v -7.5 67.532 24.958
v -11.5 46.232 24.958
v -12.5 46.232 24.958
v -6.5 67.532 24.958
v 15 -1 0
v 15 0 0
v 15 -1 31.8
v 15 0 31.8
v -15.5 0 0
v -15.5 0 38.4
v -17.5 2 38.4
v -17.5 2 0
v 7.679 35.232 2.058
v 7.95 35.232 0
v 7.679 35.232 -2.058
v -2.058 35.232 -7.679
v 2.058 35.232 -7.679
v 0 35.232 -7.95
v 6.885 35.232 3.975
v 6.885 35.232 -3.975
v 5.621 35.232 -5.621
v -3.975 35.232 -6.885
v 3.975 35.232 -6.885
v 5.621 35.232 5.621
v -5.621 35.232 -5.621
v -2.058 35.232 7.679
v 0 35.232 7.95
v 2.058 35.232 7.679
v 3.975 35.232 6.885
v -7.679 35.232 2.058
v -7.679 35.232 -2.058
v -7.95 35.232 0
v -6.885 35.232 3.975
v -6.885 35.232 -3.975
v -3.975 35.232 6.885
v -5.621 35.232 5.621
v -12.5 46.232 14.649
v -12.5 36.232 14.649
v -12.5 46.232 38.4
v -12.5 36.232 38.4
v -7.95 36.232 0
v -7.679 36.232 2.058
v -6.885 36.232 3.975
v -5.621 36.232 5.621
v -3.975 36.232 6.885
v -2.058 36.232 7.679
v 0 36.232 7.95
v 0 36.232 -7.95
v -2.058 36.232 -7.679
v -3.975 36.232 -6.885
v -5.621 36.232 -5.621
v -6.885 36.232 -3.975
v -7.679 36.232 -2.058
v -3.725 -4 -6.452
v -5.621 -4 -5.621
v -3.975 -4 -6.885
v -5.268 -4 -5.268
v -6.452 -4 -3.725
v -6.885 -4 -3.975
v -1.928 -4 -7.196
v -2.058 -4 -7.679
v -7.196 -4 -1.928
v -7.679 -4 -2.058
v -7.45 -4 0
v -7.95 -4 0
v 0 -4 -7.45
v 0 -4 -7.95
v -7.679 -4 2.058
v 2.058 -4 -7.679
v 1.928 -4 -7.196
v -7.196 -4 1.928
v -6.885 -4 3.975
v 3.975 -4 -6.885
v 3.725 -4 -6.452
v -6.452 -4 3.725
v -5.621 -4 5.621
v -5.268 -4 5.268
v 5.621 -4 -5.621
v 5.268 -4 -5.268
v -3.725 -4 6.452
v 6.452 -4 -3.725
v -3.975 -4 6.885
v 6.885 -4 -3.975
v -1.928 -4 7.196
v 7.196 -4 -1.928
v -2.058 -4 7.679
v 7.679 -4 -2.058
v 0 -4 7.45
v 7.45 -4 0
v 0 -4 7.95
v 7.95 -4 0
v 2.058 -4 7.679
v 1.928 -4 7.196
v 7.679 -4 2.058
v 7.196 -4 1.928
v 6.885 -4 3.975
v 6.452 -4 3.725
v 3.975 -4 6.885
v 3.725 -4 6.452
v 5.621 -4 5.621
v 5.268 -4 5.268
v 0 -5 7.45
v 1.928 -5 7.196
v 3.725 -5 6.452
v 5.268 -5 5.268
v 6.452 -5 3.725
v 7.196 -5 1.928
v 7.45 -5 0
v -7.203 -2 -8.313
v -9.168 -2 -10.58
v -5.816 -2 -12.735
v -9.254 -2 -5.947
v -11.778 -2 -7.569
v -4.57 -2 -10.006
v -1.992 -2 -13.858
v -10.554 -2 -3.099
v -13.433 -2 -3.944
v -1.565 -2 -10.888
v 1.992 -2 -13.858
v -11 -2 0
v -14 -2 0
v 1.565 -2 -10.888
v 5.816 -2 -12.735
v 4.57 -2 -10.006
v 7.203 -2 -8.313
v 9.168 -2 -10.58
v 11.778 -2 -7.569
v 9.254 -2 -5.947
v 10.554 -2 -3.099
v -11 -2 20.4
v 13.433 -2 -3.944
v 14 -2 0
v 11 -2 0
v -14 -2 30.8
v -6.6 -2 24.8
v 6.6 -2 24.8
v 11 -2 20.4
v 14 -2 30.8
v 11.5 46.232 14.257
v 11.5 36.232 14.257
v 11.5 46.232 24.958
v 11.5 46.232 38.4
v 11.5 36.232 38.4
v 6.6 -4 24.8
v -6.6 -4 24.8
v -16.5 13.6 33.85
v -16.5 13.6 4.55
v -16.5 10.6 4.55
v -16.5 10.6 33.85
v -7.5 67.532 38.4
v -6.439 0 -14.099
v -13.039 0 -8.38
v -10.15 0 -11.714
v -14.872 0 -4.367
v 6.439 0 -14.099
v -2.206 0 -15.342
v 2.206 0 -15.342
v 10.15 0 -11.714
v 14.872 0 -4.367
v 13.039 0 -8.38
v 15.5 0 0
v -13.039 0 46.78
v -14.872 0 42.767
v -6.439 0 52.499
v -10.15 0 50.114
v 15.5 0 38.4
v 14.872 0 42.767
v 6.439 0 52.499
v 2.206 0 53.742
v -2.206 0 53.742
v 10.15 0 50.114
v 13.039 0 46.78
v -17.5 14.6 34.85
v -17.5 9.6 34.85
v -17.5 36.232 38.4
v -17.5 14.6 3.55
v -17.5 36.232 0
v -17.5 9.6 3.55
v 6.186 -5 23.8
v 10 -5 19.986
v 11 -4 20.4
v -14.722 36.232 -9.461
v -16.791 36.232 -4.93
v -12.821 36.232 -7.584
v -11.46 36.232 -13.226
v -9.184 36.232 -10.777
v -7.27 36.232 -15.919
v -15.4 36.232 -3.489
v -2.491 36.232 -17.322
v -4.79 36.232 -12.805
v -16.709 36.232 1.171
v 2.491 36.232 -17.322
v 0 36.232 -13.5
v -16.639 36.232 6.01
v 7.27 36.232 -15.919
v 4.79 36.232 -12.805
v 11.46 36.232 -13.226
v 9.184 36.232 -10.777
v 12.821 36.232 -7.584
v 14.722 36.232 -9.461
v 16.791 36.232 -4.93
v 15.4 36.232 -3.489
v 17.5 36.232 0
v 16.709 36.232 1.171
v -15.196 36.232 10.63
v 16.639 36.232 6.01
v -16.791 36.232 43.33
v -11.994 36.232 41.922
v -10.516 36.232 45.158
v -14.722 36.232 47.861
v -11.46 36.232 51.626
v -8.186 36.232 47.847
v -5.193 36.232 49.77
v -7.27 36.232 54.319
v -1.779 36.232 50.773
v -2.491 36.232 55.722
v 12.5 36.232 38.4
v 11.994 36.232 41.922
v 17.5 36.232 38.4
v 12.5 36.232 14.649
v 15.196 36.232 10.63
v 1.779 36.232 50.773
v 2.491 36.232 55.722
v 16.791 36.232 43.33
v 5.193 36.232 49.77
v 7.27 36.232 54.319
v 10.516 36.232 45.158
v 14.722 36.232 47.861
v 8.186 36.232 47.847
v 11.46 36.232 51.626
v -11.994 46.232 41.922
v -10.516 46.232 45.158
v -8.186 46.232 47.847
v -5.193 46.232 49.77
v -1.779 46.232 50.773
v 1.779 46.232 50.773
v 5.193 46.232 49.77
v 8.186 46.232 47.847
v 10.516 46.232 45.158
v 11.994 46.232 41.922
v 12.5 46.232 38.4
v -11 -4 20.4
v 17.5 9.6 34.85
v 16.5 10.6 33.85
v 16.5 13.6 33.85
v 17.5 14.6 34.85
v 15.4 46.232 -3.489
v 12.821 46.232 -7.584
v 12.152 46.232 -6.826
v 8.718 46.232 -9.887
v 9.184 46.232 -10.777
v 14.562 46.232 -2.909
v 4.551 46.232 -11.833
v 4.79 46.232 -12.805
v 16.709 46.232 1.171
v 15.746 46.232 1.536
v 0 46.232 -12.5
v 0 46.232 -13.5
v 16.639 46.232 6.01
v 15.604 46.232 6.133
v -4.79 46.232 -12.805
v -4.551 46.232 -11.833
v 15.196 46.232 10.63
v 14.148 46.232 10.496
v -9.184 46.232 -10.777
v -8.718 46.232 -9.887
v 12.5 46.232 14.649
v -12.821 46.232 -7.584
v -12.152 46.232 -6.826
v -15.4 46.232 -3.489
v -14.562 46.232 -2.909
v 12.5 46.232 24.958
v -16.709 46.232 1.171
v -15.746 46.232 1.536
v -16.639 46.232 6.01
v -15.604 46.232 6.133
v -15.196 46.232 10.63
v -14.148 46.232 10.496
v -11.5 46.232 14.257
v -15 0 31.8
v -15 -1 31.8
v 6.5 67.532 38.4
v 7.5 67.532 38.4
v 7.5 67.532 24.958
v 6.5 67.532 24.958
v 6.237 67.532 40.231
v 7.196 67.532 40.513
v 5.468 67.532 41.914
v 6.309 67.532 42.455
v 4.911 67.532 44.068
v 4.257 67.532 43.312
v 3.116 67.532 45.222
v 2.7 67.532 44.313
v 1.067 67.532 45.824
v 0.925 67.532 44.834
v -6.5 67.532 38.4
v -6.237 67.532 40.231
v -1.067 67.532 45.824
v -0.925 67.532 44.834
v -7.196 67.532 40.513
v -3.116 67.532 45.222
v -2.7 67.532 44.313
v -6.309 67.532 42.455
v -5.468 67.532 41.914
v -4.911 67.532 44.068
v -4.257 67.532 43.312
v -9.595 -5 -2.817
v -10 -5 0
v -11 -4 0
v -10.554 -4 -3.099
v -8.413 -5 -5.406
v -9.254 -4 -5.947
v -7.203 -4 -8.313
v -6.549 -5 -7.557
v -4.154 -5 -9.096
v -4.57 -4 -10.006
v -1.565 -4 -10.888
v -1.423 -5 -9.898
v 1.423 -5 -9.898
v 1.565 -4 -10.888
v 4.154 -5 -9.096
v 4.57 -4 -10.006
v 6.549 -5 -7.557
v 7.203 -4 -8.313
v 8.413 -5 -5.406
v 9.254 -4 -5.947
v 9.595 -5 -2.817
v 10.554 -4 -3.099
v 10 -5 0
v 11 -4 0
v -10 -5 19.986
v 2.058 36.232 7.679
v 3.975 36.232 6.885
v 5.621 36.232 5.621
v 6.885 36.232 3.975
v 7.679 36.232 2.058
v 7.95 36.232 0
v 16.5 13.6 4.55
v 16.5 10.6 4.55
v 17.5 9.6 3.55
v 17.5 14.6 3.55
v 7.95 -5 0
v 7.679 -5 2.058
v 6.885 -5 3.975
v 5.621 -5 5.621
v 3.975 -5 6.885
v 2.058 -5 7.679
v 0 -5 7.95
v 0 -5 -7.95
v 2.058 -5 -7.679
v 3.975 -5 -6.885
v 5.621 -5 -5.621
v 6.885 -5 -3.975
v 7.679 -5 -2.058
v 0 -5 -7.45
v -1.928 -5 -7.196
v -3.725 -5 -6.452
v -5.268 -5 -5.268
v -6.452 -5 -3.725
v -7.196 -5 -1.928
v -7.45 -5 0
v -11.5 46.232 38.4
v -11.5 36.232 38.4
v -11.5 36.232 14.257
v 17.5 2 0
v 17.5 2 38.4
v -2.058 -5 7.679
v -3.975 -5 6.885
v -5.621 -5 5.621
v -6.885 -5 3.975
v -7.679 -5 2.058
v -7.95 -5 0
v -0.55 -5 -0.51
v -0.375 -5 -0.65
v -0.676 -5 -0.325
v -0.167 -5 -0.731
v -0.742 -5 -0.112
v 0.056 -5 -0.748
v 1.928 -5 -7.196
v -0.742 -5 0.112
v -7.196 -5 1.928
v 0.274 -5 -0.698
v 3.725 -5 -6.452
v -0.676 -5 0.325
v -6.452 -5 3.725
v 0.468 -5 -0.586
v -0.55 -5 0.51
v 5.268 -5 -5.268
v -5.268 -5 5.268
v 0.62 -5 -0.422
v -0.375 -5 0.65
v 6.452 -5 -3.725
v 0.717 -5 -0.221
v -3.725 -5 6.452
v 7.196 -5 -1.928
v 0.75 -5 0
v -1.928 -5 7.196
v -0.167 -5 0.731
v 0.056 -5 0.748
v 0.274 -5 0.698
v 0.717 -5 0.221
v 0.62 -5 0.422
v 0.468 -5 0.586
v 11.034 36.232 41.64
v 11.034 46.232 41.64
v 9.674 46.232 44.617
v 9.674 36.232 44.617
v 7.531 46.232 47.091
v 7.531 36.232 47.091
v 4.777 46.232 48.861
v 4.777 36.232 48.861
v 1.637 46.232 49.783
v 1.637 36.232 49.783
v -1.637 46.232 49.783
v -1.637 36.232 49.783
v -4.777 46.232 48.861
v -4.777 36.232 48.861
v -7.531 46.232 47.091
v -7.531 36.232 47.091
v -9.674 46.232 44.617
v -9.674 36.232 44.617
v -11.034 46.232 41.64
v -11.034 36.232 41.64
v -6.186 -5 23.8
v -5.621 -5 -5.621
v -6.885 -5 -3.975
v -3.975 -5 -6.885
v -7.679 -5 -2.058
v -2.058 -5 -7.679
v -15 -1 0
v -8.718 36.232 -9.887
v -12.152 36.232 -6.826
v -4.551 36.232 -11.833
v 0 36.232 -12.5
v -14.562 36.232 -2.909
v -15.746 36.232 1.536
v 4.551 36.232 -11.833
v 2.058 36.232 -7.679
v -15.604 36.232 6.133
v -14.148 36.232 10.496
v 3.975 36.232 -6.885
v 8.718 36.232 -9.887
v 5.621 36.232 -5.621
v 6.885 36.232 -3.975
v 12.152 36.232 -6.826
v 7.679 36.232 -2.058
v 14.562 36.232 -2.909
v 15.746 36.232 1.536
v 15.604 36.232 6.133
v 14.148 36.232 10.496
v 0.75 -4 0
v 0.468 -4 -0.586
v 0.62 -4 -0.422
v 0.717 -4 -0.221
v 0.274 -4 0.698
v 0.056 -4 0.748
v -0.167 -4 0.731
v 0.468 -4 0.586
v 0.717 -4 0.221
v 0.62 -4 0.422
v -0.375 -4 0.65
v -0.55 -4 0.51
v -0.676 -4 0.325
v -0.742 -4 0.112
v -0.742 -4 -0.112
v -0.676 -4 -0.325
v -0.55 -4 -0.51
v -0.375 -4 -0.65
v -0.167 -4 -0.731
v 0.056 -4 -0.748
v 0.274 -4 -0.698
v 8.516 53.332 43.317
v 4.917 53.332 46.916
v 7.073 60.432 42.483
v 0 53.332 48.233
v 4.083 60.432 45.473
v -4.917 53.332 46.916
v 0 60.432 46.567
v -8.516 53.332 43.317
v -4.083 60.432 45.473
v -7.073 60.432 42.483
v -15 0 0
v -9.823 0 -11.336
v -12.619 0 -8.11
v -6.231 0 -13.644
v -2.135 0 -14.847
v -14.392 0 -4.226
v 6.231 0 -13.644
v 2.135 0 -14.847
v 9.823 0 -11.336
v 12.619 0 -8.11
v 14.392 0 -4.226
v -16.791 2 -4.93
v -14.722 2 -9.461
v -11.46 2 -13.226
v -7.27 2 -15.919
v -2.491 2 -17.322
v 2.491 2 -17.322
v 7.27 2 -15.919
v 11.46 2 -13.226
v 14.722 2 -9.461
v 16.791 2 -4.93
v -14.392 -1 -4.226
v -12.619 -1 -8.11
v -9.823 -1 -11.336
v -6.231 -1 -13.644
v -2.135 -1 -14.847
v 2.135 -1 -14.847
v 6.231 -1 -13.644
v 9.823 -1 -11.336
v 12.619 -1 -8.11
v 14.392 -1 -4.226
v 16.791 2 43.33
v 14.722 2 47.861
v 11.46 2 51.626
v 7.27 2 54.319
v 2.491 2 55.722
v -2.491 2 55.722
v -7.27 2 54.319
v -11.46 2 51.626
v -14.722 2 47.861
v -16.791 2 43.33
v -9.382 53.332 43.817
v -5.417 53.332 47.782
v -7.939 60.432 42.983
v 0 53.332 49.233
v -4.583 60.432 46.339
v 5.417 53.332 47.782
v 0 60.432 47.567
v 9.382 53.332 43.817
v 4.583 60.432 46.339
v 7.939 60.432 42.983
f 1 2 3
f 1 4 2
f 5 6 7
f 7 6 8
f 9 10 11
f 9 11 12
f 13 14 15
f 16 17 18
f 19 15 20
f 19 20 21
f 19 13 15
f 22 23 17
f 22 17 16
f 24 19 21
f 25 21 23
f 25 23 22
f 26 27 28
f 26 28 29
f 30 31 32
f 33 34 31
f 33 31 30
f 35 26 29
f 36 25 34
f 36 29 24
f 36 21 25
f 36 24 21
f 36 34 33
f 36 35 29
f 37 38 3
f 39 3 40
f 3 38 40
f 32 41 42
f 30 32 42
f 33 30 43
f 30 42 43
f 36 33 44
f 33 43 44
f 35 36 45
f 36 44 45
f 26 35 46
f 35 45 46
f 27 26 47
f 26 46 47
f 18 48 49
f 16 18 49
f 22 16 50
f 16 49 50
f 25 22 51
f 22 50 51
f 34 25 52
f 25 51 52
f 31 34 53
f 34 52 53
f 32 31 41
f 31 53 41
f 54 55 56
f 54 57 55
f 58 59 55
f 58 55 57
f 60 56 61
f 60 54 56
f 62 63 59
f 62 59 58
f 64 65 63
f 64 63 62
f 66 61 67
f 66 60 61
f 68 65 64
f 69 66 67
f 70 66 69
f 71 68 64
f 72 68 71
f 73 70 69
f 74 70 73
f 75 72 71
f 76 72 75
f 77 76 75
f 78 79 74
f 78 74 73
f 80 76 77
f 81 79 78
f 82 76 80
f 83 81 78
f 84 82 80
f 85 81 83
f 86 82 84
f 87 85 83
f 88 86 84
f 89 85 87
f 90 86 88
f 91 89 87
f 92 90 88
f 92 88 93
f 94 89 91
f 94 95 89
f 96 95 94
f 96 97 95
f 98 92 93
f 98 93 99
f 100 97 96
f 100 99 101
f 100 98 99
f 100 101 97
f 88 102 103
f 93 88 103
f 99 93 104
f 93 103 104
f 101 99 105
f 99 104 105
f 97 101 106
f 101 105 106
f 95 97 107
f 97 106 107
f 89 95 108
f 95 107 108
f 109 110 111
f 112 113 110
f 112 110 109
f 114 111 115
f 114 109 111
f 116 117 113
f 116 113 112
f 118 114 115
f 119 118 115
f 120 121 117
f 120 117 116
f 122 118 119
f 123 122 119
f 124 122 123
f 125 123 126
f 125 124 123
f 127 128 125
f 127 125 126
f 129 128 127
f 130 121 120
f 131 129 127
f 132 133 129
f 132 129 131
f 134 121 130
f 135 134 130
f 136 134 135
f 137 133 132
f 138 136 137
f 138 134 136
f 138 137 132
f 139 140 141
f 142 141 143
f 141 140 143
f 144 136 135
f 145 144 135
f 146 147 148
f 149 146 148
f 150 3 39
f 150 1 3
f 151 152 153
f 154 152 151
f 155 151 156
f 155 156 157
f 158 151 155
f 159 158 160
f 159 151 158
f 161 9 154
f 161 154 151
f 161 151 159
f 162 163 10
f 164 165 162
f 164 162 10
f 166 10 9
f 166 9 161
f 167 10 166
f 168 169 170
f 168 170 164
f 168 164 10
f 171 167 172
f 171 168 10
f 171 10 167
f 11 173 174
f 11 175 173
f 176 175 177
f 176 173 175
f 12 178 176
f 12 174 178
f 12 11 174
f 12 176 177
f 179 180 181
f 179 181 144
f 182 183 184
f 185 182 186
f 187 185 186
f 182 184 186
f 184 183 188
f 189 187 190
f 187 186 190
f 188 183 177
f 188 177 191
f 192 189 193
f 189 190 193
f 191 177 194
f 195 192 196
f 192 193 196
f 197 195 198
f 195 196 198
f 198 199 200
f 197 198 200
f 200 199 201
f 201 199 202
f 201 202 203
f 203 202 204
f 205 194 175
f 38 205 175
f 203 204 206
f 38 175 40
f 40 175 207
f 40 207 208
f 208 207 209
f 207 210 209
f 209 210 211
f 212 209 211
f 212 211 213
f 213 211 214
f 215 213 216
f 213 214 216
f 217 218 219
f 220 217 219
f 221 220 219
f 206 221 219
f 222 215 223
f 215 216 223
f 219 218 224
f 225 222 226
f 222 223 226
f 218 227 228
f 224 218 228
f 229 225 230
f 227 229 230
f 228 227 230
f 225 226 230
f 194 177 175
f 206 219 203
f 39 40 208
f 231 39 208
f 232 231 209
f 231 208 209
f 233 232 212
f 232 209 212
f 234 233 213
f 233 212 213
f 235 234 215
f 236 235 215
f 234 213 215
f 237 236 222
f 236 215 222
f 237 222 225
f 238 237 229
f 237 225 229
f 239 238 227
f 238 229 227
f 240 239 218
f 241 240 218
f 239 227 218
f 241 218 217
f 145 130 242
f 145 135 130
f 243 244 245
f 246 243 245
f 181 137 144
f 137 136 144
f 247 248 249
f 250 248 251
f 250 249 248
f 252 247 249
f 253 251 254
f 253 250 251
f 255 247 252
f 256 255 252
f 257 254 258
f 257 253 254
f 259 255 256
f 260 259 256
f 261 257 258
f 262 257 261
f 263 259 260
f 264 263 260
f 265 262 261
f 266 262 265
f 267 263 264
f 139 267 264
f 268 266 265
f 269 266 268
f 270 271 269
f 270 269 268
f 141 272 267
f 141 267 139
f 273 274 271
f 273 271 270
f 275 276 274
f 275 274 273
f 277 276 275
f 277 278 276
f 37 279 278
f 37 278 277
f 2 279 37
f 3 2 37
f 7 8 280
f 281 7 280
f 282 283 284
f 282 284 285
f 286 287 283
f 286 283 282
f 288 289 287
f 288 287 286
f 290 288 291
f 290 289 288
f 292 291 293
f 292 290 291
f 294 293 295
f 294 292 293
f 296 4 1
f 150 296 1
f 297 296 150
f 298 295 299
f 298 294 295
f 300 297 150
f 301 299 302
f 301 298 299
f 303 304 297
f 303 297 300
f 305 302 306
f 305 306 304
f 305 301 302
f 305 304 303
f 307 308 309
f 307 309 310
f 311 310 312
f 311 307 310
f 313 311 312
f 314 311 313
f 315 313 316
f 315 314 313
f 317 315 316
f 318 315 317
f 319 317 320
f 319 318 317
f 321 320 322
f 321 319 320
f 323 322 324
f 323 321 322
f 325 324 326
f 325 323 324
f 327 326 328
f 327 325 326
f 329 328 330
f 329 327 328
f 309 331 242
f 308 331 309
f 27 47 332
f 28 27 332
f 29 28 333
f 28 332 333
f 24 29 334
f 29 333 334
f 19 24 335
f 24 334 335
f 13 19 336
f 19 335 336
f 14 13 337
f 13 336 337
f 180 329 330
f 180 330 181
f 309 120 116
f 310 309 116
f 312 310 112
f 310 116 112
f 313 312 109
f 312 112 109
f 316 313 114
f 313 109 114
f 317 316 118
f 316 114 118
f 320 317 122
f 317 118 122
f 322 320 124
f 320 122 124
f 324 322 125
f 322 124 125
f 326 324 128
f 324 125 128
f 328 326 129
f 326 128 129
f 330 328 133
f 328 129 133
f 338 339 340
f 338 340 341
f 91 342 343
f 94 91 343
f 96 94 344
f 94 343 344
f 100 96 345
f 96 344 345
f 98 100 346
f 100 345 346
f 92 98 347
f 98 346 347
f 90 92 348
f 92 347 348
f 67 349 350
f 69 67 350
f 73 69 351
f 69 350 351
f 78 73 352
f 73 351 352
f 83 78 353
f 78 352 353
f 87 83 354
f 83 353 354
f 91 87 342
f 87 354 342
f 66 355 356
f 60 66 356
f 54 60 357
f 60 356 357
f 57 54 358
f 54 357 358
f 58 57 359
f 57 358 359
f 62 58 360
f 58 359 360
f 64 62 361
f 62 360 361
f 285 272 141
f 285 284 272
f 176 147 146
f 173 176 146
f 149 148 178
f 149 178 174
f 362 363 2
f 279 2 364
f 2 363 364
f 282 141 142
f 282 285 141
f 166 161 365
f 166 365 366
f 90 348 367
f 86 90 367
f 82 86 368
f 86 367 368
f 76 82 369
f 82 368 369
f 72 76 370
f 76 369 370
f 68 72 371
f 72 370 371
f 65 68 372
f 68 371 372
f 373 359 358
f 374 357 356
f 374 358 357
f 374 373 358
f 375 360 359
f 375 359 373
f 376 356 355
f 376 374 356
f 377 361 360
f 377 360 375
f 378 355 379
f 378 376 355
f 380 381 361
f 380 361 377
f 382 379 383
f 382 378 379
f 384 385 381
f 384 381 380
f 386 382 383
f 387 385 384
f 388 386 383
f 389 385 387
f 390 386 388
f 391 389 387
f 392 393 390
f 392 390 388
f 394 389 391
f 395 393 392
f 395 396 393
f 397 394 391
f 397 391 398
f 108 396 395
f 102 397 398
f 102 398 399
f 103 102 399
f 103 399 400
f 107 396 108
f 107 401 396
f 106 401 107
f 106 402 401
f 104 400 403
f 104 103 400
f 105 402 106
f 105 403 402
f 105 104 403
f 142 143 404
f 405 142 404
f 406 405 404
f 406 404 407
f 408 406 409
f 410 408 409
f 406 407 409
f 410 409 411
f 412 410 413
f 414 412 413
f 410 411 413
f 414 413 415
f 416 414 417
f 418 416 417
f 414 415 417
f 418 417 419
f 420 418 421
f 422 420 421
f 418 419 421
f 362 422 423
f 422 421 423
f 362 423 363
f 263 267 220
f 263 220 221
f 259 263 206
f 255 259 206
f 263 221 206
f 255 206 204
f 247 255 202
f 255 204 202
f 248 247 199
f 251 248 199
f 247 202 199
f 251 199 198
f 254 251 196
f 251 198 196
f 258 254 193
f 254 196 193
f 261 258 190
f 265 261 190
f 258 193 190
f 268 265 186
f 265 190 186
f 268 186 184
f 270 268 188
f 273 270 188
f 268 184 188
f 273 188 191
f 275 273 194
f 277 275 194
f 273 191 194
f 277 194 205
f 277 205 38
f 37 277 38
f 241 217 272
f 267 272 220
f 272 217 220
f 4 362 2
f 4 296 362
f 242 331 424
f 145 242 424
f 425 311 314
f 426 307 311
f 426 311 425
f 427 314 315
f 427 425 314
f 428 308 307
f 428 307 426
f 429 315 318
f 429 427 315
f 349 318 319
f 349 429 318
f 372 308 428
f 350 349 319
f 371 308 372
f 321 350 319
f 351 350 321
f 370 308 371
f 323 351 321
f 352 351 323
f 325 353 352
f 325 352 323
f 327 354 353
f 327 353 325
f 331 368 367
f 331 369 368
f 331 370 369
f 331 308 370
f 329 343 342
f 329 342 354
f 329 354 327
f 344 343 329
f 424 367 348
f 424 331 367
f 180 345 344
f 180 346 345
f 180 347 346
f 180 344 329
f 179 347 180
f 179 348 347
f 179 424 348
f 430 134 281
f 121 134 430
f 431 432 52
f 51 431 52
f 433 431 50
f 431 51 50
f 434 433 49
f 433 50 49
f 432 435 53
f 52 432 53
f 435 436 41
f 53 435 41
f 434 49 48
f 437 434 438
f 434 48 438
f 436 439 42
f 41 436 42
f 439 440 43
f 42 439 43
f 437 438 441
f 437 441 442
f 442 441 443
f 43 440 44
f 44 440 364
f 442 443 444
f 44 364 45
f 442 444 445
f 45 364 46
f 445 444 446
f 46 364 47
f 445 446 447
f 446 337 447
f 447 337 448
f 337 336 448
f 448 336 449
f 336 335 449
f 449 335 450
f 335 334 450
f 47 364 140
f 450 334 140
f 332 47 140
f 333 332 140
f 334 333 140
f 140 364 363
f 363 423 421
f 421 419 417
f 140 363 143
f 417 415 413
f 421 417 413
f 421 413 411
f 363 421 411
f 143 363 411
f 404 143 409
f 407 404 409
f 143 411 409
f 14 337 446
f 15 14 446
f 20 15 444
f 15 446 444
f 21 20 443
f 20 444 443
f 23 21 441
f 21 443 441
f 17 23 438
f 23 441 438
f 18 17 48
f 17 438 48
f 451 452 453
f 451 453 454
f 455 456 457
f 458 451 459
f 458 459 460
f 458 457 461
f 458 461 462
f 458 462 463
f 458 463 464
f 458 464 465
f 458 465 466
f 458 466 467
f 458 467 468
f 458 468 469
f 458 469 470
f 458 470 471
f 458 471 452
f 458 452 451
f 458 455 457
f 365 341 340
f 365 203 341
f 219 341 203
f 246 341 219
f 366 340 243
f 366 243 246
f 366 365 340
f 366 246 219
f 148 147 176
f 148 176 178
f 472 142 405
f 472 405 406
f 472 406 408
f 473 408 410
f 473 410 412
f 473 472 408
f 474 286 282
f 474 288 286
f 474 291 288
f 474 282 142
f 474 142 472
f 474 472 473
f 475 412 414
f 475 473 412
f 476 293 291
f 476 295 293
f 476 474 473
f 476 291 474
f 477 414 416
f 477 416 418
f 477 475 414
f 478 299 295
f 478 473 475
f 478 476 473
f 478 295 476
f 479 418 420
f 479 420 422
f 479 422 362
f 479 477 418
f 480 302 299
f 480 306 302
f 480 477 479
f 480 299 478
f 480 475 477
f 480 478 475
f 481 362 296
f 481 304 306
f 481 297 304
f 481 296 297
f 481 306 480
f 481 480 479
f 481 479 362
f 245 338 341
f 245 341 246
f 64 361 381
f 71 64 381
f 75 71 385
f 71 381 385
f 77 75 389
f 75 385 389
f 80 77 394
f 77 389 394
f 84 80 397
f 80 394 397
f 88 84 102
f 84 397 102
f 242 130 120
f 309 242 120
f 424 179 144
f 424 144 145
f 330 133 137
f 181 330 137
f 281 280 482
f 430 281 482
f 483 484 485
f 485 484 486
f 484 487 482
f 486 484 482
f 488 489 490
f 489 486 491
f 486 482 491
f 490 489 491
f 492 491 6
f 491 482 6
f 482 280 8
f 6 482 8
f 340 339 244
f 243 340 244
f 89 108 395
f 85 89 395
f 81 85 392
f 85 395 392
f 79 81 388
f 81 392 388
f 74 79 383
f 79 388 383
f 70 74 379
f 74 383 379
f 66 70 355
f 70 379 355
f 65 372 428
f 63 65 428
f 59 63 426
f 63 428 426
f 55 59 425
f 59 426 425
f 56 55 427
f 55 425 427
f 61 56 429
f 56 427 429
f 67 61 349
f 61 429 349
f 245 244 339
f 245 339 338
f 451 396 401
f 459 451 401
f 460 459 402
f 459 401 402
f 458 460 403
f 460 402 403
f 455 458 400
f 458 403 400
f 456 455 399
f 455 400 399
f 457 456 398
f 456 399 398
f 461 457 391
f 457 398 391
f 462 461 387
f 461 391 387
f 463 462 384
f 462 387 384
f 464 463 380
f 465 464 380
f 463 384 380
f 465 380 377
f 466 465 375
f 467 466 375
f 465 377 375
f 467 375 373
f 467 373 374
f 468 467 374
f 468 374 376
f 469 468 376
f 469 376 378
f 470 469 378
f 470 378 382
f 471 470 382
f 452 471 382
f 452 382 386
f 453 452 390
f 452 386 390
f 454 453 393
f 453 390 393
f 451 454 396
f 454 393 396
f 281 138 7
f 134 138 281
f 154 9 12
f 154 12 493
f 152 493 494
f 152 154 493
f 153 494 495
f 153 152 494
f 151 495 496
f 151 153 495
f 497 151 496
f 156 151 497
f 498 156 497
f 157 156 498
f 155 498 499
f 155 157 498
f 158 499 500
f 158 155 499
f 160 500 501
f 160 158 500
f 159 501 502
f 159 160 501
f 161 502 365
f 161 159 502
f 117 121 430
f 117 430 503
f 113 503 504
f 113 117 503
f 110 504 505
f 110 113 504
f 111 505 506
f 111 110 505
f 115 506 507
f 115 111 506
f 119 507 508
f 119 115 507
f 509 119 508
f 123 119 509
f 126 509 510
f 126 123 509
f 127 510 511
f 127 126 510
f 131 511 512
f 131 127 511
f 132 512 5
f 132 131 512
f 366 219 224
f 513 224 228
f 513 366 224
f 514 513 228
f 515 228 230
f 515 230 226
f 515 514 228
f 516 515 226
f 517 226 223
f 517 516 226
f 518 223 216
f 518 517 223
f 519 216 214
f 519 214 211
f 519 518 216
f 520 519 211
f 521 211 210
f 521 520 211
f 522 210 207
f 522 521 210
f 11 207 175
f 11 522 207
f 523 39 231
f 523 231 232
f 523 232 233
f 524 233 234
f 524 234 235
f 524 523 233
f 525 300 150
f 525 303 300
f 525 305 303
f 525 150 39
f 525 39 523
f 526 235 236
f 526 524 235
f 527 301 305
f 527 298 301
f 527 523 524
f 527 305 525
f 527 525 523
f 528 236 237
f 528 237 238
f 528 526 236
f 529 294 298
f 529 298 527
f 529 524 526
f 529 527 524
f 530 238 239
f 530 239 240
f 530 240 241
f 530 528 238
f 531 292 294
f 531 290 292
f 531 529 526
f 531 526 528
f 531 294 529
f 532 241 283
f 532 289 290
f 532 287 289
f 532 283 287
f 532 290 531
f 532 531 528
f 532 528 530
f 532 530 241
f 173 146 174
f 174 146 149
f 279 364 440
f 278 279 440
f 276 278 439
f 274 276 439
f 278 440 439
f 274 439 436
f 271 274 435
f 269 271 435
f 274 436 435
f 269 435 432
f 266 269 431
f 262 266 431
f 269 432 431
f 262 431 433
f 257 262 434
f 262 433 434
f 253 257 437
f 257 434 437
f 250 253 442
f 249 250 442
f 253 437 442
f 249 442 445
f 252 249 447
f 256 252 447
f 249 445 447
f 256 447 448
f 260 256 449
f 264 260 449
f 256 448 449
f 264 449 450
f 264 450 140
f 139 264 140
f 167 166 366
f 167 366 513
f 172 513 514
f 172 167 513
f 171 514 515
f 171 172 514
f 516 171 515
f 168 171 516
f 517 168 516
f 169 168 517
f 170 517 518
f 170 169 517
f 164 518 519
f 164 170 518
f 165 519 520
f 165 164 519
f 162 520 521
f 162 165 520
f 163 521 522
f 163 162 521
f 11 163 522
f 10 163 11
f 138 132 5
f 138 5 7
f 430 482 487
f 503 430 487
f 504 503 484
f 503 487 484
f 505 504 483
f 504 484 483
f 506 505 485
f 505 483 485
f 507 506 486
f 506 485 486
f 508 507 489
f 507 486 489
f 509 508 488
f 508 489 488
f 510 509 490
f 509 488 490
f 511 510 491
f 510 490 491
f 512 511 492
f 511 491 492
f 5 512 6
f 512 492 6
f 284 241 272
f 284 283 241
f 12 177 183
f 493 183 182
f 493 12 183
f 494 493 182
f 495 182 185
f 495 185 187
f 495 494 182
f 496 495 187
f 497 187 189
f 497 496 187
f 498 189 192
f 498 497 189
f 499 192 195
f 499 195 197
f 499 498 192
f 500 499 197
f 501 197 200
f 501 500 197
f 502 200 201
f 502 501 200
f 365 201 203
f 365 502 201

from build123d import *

# Parameters (mm, degrees)
F1_DEPTH  = 36.232
F2_DEPTH  = 2
F4_DEPTH  = 3
F5_SIZE   = 1
F6_SIZE   = 4.4
F7_SIZE   = 1
F8_R      = 0.75
F9_DEPTH  = 1
F10_SIZE  = 2
F11_W     = 5
F11_H     = 31.3
F12_DEPTH = 1
F13_W     = 5
F13_H     = 31.3
F14_DEPTH = 1
F15_SIZE  = 0.99999
F17_DEPTH = 10
F18_DEPTH = 1


# Not quite as in the source:
# - a fillet or chamfer is up to 0.001 mm smaller than in the source, because OpenCascade refuses the exact size


with BuildPart() as f1:
    # F0 (on Front) → F1 (new body)
    with BuildSketch(Plane.XZ):
        with BuildLine():
            Line((-17.5, 38.4), (-17.5, 0))
            ThreePointArc((-17.5, 0), (0, -17.5), (17.5, 0))
            Line((17.5, 0), (17.5, 38.4))
            ThreePointArc((17.5, 38.4), (0, 55.9), (-17.5, 38.4))
        make_face()
        with BuildLine():
            ThreePointArc((15, 0), (0, -15), (-15, 0))
            Line((-15, 0), (-15, 31.8))
            Line((-15, 31.8), (-15, 38.4))
            ThreePointArc((-15, 38.4), (0, 53.4), (15, 38.4))
            Line((15, 38.4), (15, 31.8))
            Line((15, 31.8), (15, 0))
        make_face(mode=Mode.SUBTRACT)
        with BuildLine():
            Line((-15, 31.8), (-15, 0))
            ThreePointArc((-15, 0), (0, -15), (15, 0))
            Line((15, 0), (15, 31.8))
            Line((15, 31.8), (-15, 31.8))
        make_face()
        with BuildLine():
            ThreePointArc((11, 0), (0, -11), (-11, 0))
            Line((-11, 0), (-11, 24.8))
            Line((-11, 24.8), (11, 24.8))
            Line((11, 24.8), (11, 0))
        make_face(mode=Mode.SUBTRACT)
        with BuildLine():
            Line((-11, 24.8), (-11, 0))
            ThreePointArc((-11, 0), (0, -11), (11, 0))
            Line((11, 0), (11, 24.8))
            Line((11, 24.8), (-11, 24.8))
        make_face()
        with BuildLine():
            ThreePointArc((0, -7.95), (-5.6214989104, -5.6214989104), (-7.95, 0))
            ThreePointArc((-7.95, 0), (-5.6214989104, 5.6214989104), (0, 7.95))
            ThreePointArc((0, 7.95), (5.6214989104, 5.6214989104), (7.95, 0))
            ThreePointArc((7.95, 0), (5.6214989104, -5.6214989104), (0, -7.95))
        make_face(mode=Mode.SUBTRACT)
        with BuildLine():
            Line((-15, 38.4), (-15, 31.8))
            Line((-15, 31.8), (15, 31.8))
            Line((15, 31.8), (15, 38.4))
            ThreePointArc((15, 38.4), (0, 53.4), (-15, 38.4))
        make_face()
        with BuildLine():
            ThreePointArc((0, 7.95), (-5.6214989104, 5.6214989104), (-7.95, 0))
            ThreePointArc((-7.95, 0), (-5.6214989104, -5.6214989104), (0, -7.95))
            ThreePointArc((0, -7.95), (5.6214989104, -5.6214989104), (7.95, 0))
            ThreePointArc((7.95, 0), (5.6214989104, 5.6214989104), (0, 7.95))
        make_face()
    extrude(amount=-F1_DEPTH)

    # F10
    f10_edges = [f1.edges().sort_by_distance(p)[0] for p in [
        (-17.5, 0, 19.2),
    ]]
    chamfer(f10_edges, length=F10_SIZE)

    # F11 (on face) → F12 (cut)
    with BuildSketch(Plane(origin=(-17.5, 0, 0), x_dir=(0, -1, 0), z_dir=(-1, 0, 0))):
        with Locations((-12.1, 19.2)):
            Rectangle(F11_W, F11_H)
    extrude(amount=-F12_DEPTH, mode=Mode.SUBTRACT)

    # F13 (on face) → F14 (cut)
    with BuildSketch(Plane.YZ.offset(17.5)):
        with Locations((12.1, 19.2)):
            Rectangle(F13_W, F13_H)
    extrude(amount=-F14_DEPTH, mode=Mode.SUBTRACT)

    # F15 (size 1 in the source; OpenCascade refuses exactly that, so slightly less here)
    f15_edges = [f1.edges().sort_by_distance(p)[0] for p in [
        (16.5, 14.6, 19.2),
        (16.5, 9.6, 19.2),
        (16.5, 12.1, 34.85),
        (16.5, 12.1, 3.55),
        (-16.5, 12.1, 3.55),
        (-16.5, 9.6, 19.2),
        (-16.5, 12.1, 34.85),
        (-16.5, 14.6, 19.2),
    ]]
    chamfer(f15_edges, length=F15_SIZE)

    # F16 (on face) → F17 (join)
    with BuildSketch(Plane(origin=(0, 36.232, 0), x_dir=(-1, 0, 0), z_dir=(0, 1, 0))):
        with BuildLine():
            ThreePointArc((12.5, 38.4), (0, 50.9), (-12.5, 38.4))
            Line((-12.5, 38.4), (-12.5, 14.6492256372))
            ThreePointArc((-12.5, 14.6492256372), (0, -13.5), (12.5, 14.6492256372))
            Line((12.5, 14.6492256372), (12.5, 38.4))
        make_face()
        with BuildLine():
            ThreePointArc((-11.5, 38.4), (0, 49.9), (11.5, 38.4))
            Line((11.5, 38.4), (11.5, 14.2574515814))
            ThreePointArc((11.5, 14.2574515814), (0, -12.5), (-11.5, 14.2574515814))
            Line((-11.5, 14.2574515814), (-11.5, 38.4))
        make_face(mode=Mode.SUBTRACT)
    extrude(amount=F17_DEPTH)

    # F16 (on face) → F18 (cut)
    with BuildSketch(Plane(origin=(0, 36.232, 0), x_dir=(-1, 0, 0), z_dir=(0, 1, 0))):
        with BuildLine():
            ThreePointArc((0, -7.95), (5.6214989104, -5.6214989104), (7.95, 0))
            ThreePointArc((7.95, 0), (5.6214989104, 5.6214989104), (0, 7.95))
            ThreePointArc((0, 7.95), (-5.6214989104, 5.6214989104), (-7.95, 0))
            ThreePointArc((-7.95, 0), (-5.6214989104, -5.6214989104), (0, -7.95))
        make_face()
    extrude(amount=-F18_DEPTH, mode=Mode.SUBTRACT)

    # F19 (on face) → F22 section 0
    with BuildSketch(Plane(origin=(0, 46.232, 0), x_dir=(-1, 0, 0), z_dir=(0, 1, 0))):
        with BuildLine():
            Line((12.5, 24.958), (12.5, 38.4))
            ThreePointArc((12.5, 38.4), (0, 50.9), (-12.5, 38.4))
            Line((-12.5, 38.4), (-12.5, 24.958))
            Line((-12.5, 24.958), (-11.5, 24.958))
            Line((-11.5, 24.958), (-11.5, 38.4))
            ThreePointArc((-11.5, 38.4), (0, 49.9), (11.5, 38.4))
            Line((11.5, 38.4), (11.5, 24.958))
            Line((11.5, 24.958), (12.5, 24.958))
        make_face()
    # F21 (on offset) → F22 section 1
    with BuildSketch(Plane(origin=(0, 67.532, 0), x_dir=(-1, 0, 0), z_dir=(0, 1, 0))):
        with BuildLine():
            ThreePointArc((7.5, 38.4), (0, 45.9), (-7.5, 38.4))
            Line((-7.5, 38.4), (-7.5, 24.958))
            Line((-7.5, 24.958), (-6.5, 24.958))
            Line((-6.5, 24.958), (-6.5, 38.4))
            ThreePointArc((-6.5, 38.4), (0, 44.9), (6.5, 38.4))
            Line((6.5, 38.4), (6.5, 24.958))
            Line((6.5, 24.958), (7.5, 24.958))
            Line((7.5, 24.958), (7.5, 38.4))
        make_face()
    loft()


with BuildPart() as f2:
    # F0 (on Front) → F2 (new body)
    with BuildSketch(Plane.XZ):
        with BuildLine():
            Line((-15, 31.8), (-15, 0))
            ThreePointArc((-15, 0), (0, -15), (15, 0))
            Line((15, 0), (15, 31.8))
            Line((15, 31.8), (-15, 31.8))
        make_face()
        with BuildLine():
            ThreePointArc((11, 0), (0, -11), (-11, 0))
            Line((-11, 0), (-11, 24.8))
            Line((-11, 24.8), (11, 24.8))
            Line((11, 24.8), (11, 0))
        make_face(mode=Mode.SUBTRACT)
        with BuildLine():
            Line((-11, 24.8), (-11, 0))
            ThreePointArc((-11, 0), (0, -11), (11, 0))
            Line((11, 0), (11, 24.8))
            Line((11, 24.8), (-11, 24.8))
        make_face()
        with BuildLine():
            ThreePointArc((0, -7.95), (-5.6214989104, -5.6214989104), (-7.95, 0))
            ThreePointArc((-7.95, 0), (-5.6214989104, 5.6214989104), (0, 7.95))
            ThreePointArc((0, 7.95), (5.6214989104, 5.6214989104), (7.95, 0))
            ThreePointArc((7.95, 0), (5.6214989104, -5.6214989104), (0, -7.95))
        make_face(mode=Mode.SUBTRACT)
        with BuildLine():
            ThreePointArc((0, 7.95), (-5.6214989104, 5.6214989104), (-7.95, 0))
            ThreePointArc((-7.95, 0), (-5.6214989104, -5.6214989104), (0, -7.95))
            ThreePointArc((0, -7.95), (5.6214989104, -5.6214989104), (7.95, 0))
            ThreePointArc((7.95, 0), (5.6214989104, 5.6214989104), (0, 7.95))
        make_face()
    extrude(amount=F2_DEPTH)

    # F3 (on face) → F4 (join)
    with BuildSketch(Plane.XZ.offset(2)):
        with BuildLine():
            Line((-11, 24.8), (-11, 0))
            ThreePointArc((-11, 0), (0, -11), (11, 0))
            Line((11, 0), (11, 24.8))
            Line((11, 24.8), (-11, 24.8))
        make_face()
        with BuildLine():
            ThreePointArc((0, 7.95), (5.6214989104, 5.6214989104), (7.95, 0))
            ThreePointArc((7.95, 0), (5.6214989104, -5.6214989104), (0, -7.95))
            ThreePointArc((0, -7.95), (-5.6214989104, -5.6214989104), (-7.95, 0))
            ThreePointArc((-7.95, 0), (-5.6214989104, 5.6214989104), (0, 7.95))
        make_face(mode=Mode.SUBTRACT)
        with BuildLine():
            ThreePointArc((0, -7.95), (5.6214989104, -5.6214989104), (7.95, 0))
            ThreePointArc((7.95, 0), (5.6214989104, 5.6214989104), (0, 7.95))
            ThreePointArc((0, 7.95), (-5.6214989104, 5.6214989104), (-7.95, 0))
            ThreePointArc((-7.95, 0), (-5.6214989104, -5.6214989104), (0, -7.95))
        make_face()
    extrude(amount=F4_DEPTH)

    # F5
    f5_edges = [f2.edges().sort_by_distance(p)[0] for p in [
        (0, -2, 31.8),
        (-15, -2, 15.9),
    ]]
    chamfer(f5_edges, length=F5_SIZE)

    # F6
    f6_edges = [f2.edges().sort_by_distance(p)[0] for p in [
        (11, -3.5, 24.8),
        (-11, -3.5, 24.8),
    ]]
    chamfer(f6_edges, length=F6_SIZE)

    # F7
    f7_edges = [f2.edges().sort_by_distance(p)[0] for p in [
        (-11, -5, 10.2),
        (0, -5, 24.8),
        (-8.8, -5, 22.6),
        (8.8, -5, 22.6),
    ]]
    chamfer(f7_edges, length=F7_SIZE)

    # F8 (on face) → F9 (cut)
    with BuildSketch(Plane.XZ.offset(5)):
        with BuildLine():
            ThreePointArc((0, 7.95), (-5.6214989104, 5.6214989104), (-7.95, 0))
            ThreePointArc((-7.95, 0), (-5.6214989104, -5.6214989104), (0, -7.95))
            ThreePointArc((0, -7.95), (5.6214989104, -5.6214989104), (7.95, 0))
            ThreePointArc((7.95, 0), (5.6214989104, 5.6214989104), (0, 7.95))
        make_face()
        with BuildLine():
            ThreePointArc((0, -7.45), (-5.2679455198, -5.2679455198), (-7.45, 0))
            ThreePointArc((-7.45, 0), (-5.2679455198, 5.2679455198), (0, 7.45))
            ThreePointArc((0, 7.45), (5.2679455198, 5.2679455198), (7.45, 0))
            ThreePointArc((7.45, 0), (5.2679455198, -5.2679455198), (0, -7.45))
        make_face(mode=Mode.SUBTRACT)
        Circle(F8_R)
    extrude(amount=-F9_DEPTH, mode=Mode.SUBTRACT)


solid = Compound([f1.part, f2.part])
